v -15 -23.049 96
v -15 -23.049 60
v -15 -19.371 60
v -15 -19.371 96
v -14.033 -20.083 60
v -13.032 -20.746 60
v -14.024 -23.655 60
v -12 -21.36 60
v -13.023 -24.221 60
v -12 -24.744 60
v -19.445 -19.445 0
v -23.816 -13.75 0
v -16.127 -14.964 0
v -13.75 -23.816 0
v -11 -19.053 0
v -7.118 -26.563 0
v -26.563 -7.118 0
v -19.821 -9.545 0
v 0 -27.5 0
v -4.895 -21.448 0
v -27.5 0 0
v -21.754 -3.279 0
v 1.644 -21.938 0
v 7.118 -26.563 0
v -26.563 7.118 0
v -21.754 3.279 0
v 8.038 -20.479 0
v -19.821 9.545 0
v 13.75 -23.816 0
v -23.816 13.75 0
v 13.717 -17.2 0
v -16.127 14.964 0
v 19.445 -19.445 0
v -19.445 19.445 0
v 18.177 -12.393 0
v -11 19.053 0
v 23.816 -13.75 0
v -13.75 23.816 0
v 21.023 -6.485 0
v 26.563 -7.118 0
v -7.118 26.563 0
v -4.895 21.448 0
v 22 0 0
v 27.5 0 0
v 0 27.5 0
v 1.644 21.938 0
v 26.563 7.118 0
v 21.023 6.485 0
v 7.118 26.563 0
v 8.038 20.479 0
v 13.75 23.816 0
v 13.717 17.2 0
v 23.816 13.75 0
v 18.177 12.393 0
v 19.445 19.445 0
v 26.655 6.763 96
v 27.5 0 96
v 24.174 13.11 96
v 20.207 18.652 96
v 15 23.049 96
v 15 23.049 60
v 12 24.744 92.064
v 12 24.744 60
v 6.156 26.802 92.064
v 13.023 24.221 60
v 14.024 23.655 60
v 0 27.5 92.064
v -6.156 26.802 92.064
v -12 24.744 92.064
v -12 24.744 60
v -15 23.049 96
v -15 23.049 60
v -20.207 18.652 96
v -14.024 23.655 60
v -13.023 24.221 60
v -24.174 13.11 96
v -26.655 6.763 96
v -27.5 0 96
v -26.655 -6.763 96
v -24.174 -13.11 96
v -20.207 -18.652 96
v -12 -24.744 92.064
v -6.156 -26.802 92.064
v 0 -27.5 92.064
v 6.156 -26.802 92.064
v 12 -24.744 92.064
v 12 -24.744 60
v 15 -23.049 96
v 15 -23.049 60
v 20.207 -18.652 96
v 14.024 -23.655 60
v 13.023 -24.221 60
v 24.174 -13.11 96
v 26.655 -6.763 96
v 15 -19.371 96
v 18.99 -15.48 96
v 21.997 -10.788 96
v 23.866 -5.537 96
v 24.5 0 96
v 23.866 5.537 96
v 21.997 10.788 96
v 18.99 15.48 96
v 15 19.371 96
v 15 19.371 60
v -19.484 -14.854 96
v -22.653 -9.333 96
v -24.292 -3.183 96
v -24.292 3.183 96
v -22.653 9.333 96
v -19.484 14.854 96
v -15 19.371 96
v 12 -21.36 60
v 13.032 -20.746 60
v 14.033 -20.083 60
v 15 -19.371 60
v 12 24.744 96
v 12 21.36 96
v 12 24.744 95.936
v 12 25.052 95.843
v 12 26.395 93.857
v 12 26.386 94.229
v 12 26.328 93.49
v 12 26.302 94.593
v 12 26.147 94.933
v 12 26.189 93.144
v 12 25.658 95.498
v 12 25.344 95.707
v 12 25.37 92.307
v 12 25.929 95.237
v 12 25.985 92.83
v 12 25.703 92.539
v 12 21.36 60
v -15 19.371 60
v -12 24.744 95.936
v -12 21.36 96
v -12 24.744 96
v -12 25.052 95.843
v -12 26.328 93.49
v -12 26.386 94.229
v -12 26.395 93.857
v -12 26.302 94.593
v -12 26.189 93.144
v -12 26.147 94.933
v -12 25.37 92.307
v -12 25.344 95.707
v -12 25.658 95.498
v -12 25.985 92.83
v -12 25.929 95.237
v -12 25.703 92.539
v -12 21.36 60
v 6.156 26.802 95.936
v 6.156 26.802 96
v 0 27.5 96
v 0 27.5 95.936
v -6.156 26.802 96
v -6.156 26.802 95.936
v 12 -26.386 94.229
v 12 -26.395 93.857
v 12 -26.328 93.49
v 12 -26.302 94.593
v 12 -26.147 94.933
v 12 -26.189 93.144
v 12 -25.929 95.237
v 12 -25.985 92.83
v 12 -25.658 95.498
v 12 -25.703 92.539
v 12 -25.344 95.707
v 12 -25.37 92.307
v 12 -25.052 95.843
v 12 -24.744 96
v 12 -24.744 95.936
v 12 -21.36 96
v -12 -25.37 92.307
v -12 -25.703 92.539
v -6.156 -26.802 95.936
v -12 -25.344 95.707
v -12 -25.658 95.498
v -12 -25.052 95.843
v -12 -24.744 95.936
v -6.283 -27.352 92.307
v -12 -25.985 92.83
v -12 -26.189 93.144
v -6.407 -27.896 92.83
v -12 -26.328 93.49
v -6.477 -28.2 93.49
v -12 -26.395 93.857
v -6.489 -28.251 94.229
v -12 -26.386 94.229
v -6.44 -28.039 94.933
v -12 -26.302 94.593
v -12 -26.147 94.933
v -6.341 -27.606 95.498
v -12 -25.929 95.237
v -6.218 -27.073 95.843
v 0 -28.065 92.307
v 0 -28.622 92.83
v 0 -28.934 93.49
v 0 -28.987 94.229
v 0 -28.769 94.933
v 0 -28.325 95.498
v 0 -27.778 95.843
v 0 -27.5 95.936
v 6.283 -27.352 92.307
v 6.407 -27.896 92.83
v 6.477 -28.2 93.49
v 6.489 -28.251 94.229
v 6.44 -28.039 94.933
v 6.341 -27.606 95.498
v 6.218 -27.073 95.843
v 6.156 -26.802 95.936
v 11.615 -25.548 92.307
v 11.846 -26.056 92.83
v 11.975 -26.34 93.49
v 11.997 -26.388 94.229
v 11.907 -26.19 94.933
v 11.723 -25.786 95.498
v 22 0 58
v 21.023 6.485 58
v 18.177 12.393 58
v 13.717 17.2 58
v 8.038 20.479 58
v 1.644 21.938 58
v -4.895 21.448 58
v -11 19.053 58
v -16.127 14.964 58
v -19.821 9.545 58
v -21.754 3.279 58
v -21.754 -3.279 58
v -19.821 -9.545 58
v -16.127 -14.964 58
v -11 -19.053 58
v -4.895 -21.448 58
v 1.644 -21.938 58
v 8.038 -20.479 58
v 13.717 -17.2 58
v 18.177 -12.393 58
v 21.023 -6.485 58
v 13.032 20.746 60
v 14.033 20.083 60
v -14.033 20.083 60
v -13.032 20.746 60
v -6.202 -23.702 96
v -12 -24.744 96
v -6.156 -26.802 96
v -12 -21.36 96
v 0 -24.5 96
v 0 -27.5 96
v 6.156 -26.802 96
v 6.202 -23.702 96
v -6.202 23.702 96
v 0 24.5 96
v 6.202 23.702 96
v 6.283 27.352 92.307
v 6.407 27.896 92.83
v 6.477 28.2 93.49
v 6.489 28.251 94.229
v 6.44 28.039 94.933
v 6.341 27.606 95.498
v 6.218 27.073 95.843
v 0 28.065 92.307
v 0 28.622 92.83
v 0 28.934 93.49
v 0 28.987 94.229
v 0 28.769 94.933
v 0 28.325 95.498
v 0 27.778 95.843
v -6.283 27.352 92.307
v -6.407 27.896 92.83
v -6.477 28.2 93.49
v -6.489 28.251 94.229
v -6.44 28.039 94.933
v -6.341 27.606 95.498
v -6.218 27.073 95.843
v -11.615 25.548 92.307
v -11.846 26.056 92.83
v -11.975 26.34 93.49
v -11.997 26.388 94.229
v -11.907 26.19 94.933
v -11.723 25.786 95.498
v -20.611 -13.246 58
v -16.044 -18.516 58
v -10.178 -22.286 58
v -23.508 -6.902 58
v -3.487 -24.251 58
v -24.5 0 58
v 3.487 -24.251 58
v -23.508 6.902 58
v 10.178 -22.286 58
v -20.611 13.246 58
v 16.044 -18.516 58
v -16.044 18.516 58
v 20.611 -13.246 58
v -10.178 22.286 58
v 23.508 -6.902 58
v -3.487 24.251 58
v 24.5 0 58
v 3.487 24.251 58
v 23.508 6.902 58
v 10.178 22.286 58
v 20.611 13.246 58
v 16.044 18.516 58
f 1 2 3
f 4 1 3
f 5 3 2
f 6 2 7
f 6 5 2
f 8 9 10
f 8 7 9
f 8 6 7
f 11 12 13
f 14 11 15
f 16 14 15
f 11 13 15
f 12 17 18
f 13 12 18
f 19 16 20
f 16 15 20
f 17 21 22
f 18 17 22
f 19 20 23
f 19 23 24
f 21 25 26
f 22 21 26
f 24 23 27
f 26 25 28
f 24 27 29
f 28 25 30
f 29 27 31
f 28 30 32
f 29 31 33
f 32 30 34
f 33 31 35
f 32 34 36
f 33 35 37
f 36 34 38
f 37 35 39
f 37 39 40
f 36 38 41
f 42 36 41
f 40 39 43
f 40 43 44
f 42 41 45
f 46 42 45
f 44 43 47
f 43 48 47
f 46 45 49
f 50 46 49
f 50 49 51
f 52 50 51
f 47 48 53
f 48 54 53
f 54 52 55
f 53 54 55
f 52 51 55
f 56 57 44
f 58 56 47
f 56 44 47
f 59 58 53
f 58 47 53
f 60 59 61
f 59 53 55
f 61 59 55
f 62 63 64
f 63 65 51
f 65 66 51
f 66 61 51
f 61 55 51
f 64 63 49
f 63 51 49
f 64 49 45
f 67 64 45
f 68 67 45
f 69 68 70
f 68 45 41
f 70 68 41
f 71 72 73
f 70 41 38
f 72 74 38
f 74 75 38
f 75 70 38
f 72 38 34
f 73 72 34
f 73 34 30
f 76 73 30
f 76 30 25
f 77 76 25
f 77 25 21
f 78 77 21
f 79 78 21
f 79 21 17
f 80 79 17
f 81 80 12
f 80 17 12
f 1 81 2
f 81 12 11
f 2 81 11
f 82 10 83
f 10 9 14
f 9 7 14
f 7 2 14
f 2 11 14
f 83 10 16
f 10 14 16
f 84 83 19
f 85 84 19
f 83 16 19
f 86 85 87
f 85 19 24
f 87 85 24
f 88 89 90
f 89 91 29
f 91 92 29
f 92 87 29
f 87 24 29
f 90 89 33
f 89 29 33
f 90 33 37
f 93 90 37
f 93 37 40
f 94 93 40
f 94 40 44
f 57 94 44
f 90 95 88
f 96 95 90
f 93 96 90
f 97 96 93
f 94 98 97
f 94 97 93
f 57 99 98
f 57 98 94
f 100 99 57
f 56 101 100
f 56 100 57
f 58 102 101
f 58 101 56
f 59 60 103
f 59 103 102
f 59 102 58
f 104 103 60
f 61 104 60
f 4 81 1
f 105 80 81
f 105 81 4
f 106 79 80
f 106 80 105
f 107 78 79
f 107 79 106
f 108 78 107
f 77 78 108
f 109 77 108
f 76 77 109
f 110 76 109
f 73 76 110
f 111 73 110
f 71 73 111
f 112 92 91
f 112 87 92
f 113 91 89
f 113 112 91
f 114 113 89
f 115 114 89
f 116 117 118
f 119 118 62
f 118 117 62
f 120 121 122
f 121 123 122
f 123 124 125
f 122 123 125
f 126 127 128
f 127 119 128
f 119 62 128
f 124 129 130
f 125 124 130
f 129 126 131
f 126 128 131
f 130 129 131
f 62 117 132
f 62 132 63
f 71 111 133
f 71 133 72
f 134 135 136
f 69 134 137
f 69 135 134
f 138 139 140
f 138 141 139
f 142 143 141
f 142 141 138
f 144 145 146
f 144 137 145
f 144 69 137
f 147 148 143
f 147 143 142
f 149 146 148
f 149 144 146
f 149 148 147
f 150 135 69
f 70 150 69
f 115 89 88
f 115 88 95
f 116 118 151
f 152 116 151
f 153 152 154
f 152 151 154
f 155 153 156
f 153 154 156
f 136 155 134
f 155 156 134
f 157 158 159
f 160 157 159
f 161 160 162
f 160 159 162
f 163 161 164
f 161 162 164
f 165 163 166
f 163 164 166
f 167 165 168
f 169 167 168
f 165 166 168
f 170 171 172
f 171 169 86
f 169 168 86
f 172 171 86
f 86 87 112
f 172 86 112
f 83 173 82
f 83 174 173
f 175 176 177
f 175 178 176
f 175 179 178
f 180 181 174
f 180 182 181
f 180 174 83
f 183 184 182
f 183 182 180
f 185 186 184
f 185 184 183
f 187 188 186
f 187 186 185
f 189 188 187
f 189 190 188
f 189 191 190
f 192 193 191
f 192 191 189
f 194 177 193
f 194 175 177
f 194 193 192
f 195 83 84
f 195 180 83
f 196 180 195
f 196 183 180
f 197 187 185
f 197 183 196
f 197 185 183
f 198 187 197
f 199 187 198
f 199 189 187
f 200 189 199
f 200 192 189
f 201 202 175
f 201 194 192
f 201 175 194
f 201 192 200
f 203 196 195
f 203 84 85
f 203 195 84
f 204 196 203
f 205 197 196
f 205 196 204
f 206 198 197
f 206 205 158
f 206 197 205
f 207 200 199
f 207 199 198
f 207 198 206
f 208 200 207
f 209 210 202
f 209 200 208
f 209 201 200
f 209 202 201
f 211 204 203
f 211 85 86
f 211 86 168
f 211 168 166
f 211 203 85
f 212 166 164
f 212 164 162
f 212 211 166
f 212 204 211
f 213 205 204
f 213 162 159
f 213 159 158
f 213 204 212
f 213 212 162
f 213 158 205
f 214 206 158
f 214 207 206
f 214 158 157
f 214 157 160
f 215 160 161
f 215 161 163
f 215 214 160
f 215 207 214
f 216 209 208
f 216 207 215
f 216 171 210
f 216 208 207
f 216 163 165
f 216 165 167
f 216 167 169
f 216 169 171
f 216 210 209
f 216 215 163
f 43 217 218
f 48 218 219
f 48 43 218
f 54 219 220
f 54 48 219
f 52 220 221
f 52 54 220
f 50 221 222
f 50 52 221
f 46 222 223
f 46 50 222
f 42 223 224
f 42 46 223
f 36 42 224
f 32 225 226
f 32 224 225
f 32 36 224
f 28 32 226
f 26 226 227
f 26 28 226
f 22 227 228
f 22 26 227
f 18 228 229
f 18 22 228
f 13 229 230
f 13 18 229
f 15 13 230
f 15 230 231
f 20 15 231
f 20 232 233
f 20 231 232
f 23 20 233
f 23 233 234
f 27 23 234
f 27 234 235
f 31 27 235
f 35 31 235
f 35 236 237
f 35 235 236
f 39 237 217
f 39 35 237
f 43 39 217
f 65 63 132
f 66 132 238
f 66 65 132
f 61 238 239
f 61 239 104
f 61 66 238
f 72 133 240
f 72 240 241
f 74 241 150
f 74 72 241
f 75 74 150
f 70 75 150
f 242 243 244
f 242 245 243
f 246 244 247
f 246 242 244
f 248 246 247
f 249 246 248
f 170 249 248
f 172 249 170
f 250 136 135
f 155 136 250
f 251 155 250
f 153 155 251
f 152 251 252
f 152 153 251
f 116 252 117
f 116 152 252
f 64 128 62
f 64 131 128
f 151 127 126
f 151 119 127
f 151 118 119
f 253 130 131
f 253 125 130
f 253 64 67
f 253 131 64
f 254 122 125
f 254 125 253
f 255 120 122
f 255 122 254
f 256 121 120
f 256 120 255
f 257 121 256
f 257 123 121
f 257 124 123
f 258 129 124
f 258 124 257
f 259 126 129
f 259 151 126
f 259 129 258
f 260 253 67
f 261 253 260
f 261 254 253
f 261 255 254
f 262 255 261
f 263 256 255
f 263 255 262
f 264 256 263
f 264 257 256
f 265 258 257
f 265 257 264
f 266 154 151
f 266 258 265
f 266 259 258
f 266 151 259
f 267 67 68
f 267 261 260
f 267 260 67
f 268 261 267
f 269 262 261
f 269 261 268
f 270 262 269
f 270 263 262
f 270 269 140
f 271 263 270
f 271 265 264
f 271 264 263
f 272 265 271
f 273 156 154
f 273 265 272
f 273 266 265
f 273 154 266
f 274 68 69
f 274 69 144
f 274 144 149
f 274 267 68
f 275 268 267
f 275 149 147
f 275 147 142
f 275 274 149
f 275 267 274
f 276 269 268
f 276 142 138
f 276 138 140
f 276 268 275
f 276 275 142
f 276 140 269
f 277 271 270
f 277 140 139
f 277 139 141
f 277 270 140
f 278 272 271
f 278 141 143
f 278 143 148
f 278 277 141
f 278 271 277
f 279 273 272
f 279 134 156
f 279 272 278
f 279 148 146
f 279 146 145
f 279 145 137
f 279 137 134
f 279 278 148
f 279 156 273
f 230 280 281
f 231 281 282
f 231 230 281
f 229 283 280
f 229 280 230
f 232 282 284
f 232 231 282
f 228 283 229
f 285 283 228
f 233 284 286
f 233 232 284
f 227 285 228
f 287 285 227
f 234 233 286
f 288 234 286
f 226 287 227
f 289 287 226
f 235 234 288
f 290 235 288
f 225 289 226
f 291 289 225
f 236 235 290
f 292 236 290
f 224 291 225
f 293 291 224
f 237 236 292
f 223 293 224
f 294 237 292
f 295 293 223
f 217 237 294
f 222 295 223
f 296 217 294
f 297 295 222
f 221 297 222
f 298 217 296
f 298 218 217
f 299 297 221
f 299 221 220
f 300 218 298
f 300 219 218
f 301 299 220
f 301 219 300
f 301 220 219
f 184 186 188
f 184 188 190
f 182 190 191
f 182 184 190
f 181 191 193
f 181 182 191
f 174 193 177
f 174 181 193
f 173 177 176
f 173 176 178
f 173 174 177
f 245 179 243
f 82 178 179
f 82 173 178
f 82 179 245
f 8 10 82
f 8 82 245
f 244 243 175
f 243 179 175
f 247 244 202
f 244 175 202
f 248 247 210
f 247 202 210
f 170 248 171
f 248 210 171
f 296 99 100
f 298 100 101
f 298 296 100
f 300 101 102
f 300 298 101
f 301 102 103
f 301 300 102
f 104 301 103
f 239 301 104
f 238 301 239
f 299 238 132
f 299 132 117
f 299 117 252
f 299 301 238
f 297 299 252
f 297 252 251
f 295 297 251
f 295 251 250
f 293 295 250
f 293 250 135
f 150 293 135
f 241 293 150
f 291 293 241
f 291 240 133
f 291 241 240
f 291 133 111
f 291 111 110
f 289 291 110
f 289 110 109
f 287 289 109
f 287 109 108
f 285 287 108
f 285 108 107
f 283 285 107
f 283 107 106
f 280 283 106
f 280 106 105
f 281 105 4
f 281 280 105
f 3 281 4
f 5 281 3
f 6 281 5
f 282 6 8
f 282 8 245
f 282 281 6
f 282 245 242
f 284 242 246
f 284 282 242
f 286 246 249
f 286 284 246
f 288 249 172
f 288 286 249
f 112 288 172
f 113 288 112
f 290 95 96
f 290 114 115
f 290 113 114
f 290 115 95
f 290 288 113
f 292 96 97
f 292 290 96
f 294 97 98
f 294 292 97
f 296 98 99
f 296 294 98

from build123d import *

# Parameters (mm, degrees)
BOX_W                    = 3
BOX_H                    = 90
BOX_DEPTH                = 40
BOX001_W                 = 3
BOX001_H                 = 90
BOX001_DEPTH             = 40
TORUS_R                  = 2
TORUS_ANGLE              = 60
TORUS_PLACEMENT_ANGLE    = 60
TORUS001_R               = 2
TORUS001_ANGLE           = 60
TORUS001_PLACEMENT_ANGLE = 240
CYLINDER001_R            = 24.5
CYLINDER001_DEPTH        = 55
CYLINDER002_R            = 24.5
CYLINDER002_DEPTH        = 60
CYLINDER008_R            = 22
CYLINDER008_DEPTH        = 90
CYLINDER_R               = 27.5
CYLINDER_DEPTH           = 96


with BuildPart() as cube:
    # Box → Box (new body)
    with BuildSketch(Plane(origin=(12, -40, 60), x_dir=(1, 0, 0), z_dir=(0, 0, 1))):
        with Locations((1.5, 45)):
            Rectangle(BOX_W, BOX_H)
    extrude(amount=BOX_DEPTH)


with BuildPart() as fusion002:
    # Box001 → Box001 (new body)
    with BuildSketch(Plane(origin=(-15, -40, 60), x_dir=(1, 0, 0), z_dir=(0, 0, 1))):
        with Locations((1.5, 45)):
            Rectangle(BOX001_W, BOX001_H)
    extrude(amount=BOX001_DEPTH)

    # Fusion002: union Cube
    add(cube.part)


with BuildPart() as torus:
    # Torus → Torus (revolve)
    with BuildSketch(Plane.XZ):
        with Locations((27, 0)):
            Circle(TORUS_R)
    revolve(axis=Axis((0, 0, 0), (0, 0, 1)), revolution_arc=TORUS_ANGLE)


with BuildPart() as torus_1:
    # Torus placement: moved
    add(torus.part.moved(Location((0, 0, 94))).rotate(Axis((0, 0, 94), (0, 0, 1)), TORUS_PLACEMENT_ANGLE))


with BuildPart() as torus001:
    # Torus001 → Torus001 (revolve)
    with BuildSketch(Plane.XZ):
        with Locations((27, 0)):
            Circle(TORUS001_R)
    revolve(axis=Axis((0, 0, 0), (0, 0, 1)), revolution_arc=TORUS001_ANGLE)


with BuildPart() as torus001_1:
    # Torus001 placement: moved
    add(torus001.part.moved(Location((0, 0, 94))).rotate(Axis((0, 0, 94), (0, 0, 1)), TORUS001_PLACEMENT_ANGLE))


with BuildPart() as cylinder001:
    # Cylinder001 → Cylinder001 (new body)
    with BuildSketch(Plane.XY.offset(58)):
        Circle(CYLINDER001_R)
    extrude(amount=CYLINDER001_DEPTH)


with BuildPart() as fusion:
    # Cylinder002 → Cylinder002 (new body)
    with BuildSketch(Plane.XY.offset(58)):
        Circle(CYLINDER002_R)
    extrude(amount=CYLINDER002_DEPTH)

    # Fusion: union Cylinder001
    add(cylinder001.part)


with BuildPart() as cylinder008:
    # Cylinder008 → Cylinder008 (new body)
    with BuildSketch(Plane.XY):
        Circle(CYLINDER008_R)
    extrude(amount=CYLINDER008_DEPTH)


with BuildPart() as main_bit:
    # Cylinder → Cylinder (new body)
    with BuildSketch(Plane.XY):
        Circle(CYLINDER_R)
    extrude(amount=CYLINDER_DEPTH)

    # Cut: cut Cylinder008
    add(cylinder008.part, mode=Mode.SUBTRACT)

    # Cut004: cut Fusion
    add(fusion.part, mode=Mode.SUBTRACT)

    # Fusion001: union Torus, Torus001
    add(torus_1.part)
    add(torus001_1.part)

    # Cut007: cut Fusion002
    add(fusion002.part, mode=Mode.SUBTRACT)


solid = main_bit.part
